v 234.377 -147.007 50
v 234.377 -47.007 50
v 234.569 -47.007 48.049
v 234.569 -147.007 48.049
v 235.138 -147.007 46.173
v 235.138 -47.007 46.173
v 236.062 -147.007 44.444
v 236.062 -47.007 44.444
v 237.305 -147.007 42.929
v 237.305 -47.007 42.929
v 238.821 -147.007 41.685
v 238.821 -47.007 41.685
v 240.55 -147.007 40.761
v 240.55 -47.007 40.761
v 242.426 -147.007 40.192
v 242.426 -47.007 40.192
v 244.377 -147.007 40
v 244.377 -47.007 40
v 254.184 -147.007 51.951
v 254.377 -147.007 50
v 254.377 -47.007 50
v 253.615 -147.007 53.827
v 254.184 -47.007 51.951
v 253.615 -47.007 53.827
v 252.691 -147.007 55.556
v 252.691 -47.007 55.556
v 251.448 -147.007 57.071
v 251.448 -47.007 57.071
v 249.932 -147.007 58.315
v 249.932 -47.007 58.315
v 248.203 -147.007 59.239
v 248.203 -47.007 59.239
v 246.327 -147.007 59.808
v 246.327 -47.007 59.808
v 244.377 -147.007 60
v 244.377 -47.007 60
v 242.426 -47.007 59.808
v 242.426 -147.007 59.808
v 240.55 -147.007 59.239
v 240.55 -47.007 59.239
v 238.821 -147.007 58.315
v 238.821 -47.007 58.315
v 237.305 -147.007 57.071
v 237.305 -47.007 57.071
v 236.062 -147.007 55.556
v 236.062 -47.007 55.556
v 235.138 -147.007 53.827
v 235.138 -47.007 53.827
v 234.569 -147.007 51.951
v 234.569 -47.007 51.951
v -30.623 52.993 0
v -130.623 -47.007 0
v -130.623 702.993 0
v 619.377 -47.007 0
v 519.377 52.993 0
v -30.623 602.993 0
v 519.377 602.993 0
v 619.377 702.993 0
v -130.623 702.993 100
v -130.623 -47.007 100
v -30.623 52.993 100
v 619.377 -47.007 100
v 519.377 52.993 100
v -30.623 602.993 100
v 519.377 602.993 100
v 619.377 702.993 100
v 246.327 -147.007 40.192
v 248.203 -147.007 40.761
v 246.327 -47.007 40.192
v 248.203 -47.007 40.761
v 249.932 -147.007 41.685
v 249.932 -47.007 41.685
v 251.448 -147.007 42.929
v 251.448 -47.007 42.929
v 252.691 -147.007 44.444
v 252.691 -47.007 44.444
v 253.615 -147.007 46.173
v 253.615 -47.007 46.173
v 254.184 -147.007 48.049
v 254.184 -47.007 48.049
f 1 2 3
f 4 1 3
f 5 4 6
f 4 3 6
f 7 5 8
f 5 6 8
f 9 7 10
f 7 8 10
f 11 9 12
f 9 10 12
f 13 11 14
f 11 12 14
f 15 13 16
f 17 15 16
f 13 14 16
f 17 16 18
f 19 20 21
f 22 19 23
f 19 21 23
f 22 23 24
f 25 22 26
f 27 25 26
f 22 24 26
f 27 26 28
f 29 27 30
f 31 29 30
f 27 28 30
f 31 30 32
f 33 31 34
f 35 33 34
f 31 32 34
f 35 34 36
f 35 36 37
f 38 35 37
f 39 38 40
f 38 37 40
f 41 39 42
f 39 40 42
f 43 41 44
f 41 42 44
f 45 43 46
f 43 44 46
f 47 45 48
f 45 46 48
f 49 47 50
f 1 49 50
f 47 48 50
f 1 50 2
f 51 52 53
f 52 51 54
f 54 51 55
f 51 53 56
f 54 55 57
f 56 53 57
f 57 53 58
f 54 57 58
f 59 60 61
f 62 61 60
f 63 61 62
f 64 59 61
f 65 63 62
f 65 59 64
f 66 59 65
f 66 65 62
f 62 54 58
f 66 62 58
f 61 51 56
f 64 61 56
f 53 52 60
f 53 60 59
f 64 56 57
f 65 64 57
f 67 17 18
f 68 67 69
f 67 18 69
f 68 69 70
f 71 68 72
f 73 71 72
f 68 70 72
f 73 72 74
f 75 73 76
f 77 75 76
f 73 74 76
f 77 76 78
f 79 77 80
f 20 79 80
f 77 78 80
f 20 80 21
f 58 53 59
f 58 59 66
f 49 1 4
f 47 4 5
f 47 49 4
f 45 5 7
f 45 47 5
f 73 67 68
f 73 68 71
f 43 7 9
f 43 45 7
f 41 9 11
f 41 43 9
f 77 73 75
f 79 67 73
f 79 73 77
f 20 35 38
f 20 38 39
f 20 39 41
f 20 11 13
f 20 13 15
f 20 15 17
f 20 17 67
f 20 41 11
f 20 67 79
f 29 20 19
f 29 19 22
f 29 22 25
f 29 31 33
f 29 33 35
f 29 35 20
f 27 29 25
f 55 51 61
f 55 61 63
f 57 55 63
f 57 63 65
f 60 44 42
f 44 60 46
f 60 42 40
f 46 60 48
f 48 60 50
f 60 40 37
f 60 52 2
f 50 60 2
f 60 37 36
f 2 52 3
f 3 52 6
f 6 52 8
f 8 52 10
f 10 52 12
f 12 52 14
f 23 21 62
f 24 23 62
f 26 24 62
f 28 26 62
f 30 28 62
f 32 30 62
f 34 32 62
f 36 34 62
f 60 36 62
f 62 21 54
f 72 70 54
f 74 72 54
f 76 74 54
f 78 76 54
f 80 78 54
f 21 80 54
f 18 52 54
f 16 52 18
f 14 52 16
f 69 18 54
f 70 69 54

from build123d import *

# Parameters (mm, degrees)
F0_W     = 750
F0_H     = 750
F0_W_2   = 550
F0_H_2   = 550
F1_DEPTH = 100
F3_DEPTH = 100


with BuildPart() as f1:
    # F0 (on Top) → F1 (new body)
    with BuildSketch(Plane.XY):
        with Locations((244.376540184, 327.9930502176)):
            Rectangle(F0_W, F0_H)
        with Locations((244.376540184, 327.9930502176)):
            Rectangle(F0_W_2, F0_H_2, mode=Mode.SUBTRACT)
    extrude(amount=F1_DEPTH)

    # F2 (on face) → F3 (join)
    with BuildSketch(Plane.XZ.offset(47.0069497824)):
        with BuildLine():
            Line((244.376540184, 50), (254.376540184, 50))
            ThreePointArc((254.376540184, 50), (251.4476079959, 57.0710678119), (244.376540184, 60))
            Line((244.376540184, 60), (244.376540184, 50))
        make_face()
        with BuildLine():
            Line((234.376540184, 50), (244.376540184, 50))
            Line((244.376540184, 50), (244.376540184, 60))
            ThreePointArc((244.376540184, 60), (237.3054723722, 57.0710678119), (234.376540184, 50))
        make_face()
        with BuildLine():
            Line((244.376540184, 40), (244.376540184, 50))
            Line((244.376540184, 50), (234.376540184, 50))
            ThreePointArc((234.376540184, 50), (237.3054723722, 42.9289321881), (244.376540184, 40))
        make_face()
        with BuildLine():
            ThreePointArc((244.376540184, 40), (251.4476079959, 42.9289321881), (254.376540184, 50))
            Line((254.376540184, 50), (244.376540184, 50))
            Line((244.376540184, 50), (244.376540184, 40))
        make_face()
    extrude(amount=F3_DEPTH)


solid = f1.part
